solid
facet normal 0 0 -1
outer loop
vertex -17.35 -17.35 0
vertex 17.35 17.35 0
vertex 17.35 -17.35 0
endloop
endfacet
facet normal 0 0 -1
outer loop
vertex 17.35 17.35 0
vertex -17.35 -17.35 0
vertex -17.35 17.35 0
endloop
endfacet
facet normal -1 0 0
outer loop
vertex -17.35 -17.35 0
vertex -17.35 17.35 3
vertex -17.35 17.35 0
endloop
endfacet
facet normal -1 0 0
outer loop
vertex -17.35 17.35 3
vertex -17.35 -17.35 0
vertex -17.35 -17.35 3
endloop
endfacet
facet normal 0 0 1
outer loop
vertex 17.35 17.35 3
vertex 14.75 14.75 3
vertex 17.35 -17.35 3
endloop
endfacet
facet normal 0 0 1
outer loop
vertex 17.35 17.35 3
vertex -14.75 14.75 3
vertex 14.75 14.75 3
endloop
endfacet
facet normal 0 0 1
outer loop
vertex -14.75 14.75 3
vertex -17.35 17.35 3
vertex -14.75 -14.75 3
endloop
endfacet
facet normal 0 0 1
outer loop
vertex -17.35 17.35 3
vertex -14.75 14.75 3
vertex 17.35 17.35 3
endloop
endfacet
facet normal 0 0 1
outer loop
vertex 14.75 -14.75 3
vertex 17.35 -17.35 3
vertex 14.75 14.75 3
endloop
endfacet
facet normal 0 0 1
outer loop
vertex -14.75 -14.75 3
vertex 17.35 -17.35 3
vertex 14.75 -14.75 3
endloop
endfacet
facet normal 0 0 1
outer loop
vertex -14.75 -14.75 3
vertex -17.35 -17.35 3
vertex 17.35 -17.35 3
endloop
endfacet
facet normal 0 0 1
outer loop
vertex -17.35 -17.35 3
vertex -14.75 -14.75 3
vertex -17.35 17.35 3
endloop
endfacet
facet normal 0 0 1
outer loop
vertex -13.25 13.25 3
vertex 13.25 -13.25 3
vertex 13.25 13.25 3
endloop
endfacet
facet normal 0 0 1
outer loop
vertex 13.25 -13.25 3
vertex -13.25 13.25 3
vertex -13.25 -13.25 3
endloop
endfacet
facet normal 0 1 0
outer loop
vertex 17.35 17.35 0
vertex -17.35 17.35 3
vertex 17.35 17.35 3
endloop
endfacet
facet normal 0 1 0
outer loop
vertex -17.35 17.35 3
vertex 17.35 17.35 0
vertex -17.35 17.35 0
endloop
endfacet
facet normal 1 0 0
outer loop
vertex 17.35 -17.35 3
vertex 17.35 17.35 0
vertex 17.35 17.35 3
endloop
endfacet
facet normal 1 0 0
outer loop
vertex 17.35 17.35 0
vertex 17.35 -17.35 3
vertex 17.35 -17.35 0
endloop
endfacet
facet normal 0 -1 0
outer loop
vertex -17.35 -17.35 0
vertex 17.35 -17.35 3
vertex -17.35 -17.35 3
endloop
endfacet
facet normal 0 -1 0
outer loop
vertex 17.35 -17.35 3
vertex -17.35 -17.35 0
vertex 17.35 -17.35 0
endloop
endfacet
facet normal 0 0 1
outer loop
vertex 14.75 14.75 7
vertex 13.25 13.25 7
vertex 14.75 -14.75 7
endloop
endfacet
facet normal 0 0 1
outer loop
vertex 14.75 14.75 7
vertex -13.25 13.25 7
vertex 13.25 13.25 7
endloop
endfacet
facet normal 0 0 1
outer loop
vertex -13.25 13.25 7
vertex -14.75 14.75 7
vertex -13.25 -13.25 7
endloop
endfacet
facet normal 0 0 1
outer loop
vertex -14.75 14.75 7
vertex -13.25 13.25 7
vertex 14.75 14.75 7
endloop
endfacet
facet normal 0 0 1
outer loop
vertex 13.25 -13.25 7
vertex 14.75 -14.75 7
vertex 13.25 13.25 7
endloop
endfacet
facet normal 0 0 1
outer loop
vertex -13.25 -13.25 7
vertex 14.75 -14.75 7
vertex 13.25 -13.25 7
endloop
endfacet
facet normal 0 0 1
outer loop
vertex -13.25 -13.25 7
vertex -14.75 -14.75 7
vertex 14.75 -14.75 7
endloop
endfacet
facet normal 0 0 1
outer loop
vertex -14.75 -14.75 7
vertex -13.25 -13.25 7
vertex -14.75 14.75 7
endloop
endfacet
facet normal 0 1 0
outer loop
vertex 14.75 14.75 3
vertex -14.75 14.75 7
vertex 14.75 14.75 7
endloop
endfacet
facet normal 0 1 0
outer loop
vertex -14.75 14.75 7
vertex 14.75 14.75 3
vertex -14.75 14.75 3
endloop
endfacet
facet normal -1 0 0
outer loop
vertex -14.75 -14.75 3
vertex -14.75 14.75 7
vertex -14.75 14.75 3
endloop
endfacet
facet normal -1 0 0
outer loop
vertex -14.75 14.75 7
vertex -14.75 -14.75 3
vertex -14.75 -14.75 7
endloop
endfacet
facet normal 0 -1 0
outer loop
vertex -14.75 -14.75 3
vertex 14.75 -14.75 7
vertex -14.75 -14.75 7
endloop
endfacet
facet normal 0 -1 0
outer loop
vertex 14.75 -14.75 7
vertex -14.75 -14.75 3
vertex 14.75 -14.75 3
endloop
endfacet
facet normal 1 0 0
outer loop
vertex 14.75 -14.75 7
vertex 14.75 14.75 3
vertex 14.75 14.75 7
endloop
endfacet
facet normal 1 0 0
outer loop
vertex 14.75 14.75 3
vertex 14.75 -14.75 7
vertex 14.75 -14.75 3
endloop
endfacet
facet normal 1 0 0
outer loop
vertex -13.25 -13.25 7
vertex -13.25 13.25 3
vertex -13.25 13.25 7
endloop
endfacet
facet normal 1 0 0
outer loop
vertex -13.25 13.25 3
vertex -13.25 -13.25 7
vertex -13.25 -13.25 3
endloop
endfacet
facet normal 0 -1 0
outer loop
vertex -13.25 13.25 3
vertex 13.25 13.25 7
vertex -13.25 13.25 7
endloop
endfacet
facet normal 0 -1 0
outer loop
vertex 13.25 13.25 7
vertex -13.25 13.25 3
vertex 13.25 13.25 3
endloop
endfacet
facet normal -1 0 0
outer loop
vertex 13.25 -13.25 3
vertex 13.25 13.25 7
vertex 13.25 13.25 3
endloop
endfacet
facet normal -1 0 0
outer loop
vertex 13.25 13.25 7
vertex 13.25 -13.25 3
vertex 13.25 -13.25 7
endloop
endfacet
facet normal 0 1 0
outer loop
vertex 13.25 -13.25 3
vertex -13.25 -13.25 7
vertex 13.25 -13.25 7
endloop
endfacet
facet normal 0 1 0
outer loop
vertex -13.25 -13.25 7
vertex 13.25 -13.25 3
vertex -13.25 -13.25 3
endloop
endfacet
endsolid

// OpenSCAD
// file: ../diffuser.scad
// Swappable diffuser panel. Thickness is the STL knob; the diffusing structure
// (gyroid/grid, density, top/bottom solid layers = 0) is set in the slicer.

module diffuser_panel(t) {
    linear_extrude(t) square([panel_side, panel_side], center = true);
}

// Diffuser LID = flanged plug. The plug drops INTO the opening (locates it, light
// grip so it won't slide); the flange overhangs by ~the wall width and rests on
// the rim so it can't fall through. Lifts straight off for swapping, and works on
// touching chimneys (the plug uses the open hole, not the side walls). The flange
// is the diffuser face (thickness t). Set lid_plug_h = 0 for a plain flat tile.
// Modeled diffuser-face-down (z=0..t) = print orientation; flip in use.
module diffuser_lid(t) {
    fside = cell_inner + 2 * lid_flange_cover - lid_flange_gap;  // flange (rests on the rim)
    pside = cell_inner - lid_plug_clear;                          // plug (drops into the opening)
    union() {
        linear_extrude(t) square([fside, fside], center = true); // flange / diffuser face
        if (lid_plug_h > 0)
            translate([0, 0, t])
                linear_extrude(lid_plug_h)
                    difference() {
                        square([pside, pside], center = true);
                        square([pside - 2 * lid_plug_wall, pside - 2 * lid_plug_wall], center = true);
                    }
    }
}

// Slide-over diffuser CAP: a diffuser top + a skirt that slides over the OUTSIDE
// of a chimney. Only works on an ISOLATED column (needs side clearance for the
// skirt) — kept for possible use on the real letters, NOT the touching coupon.
// Modeled diffuser-face-down (z=0..t) = print orientation.
module diffuser_cap(t) {
    si = cell_pitch + cap_fit_clear;      // skirt inner — slides over the chimney outer
    so = si + 2 * cap_skirt_t;            // skirt outer
    union() {
        linear_extrude(t) square([so, so], center = true);          // diffuser face
        translate([0, 0, t])
            linear_extrude(cap_skirt_h)                             // skirt
                difference() {
                    square([so, so], center = true);
                    square([si, si], center = true);
                }
    }
}
// file: ../config.scad
// ===== CHARGE LED sign — global config =====
// Edit this file; then run ./build.sh to regenerate every STL.

$fn = 72;

// ---- calibrated collar (press-fit for 12mm bullet pixel) ----
collar_stl    = "../../assets/bullet-collar.stl"; // path resolved from src/parts/ entry files
collar_h      = 2.0;     // Z span of the collar STL
collar_od     = 16.0;    // collar outer diameter
collar_cx     = 43.0;    // STL native X center (Y center is 0)
pixel_through = 12.3;    // clearance hole through the plate (just over bore Ø12.19)
dome_clear    = 4.0;     // dome protrusion above plate front. Spec: 5.5mm dome-tip-to-flange,
                         // flange seats on plate back, minus 2mm plate ~= 3.5-4mm. Seat a real
                         // pixel and measure to lock it in.

// ---- shell ----
plate_t    = 2.0;        // rear plate thickness (== collar_h, so the collar sits flush)
wall_t     = 2.5;        // chimney wall thickness
cell_inner = 30;         // square interior of each test cell (the press-fit opening)

// ---- diffuser panels (flat, drop-in — kept for the final glued option) ----
panel_press_clear = 0.25; // panel is this much SMALLER than the opening (total) -> friction fit
panel_thicks      = [1, 2, 3];

// ---- diffuser CAP (slides over an ISOLATED chimney; not used on touching rows) ----
cap_fit_clear = 0.4;   // skirt-inner minus chimney-outer (total); bigger = looser slide
cap_skirt_t   = 1.6;   // skirt wall thickness
cap_skirt_h   = 7;     // how far the skirt grips down over the chimney

// ---- diffuser LID = flanged plug (plug locates in the opening, flange catches on the rim) ----
lid_flange_cover = wall_t;  // flange overhang per side ~= wall width (rests on rim, can't fall in)
lid_flange_gap   = 0.3;     // shrink the flange a hair so neighbour lids don't clash
lid_plug_h       = 4;       // how far the plug drops into the opening (0 = plain flat tile)
lid_plug_clear   = 0.5;     // plug-outer = opening minus this (total) -> snug slip fit
lid_plug_wall    = 1.5;     // plug-frame wall thickness

// ---- coupon depth ladder ----
led_gaps = [20, 35, 50]; // clear LED-tip -> panel distance, per cell (mm)

// ---- collar v2: original bore + lip, plus a 45-deg lead-in chamfer ----
bore_face_r   = 6.10;    // collar bore radius at each face (~Ø12.2)
chamfer_depth = 0.5;     // axial depth of the 45-deg lead-in at each face
mouth_r       = bore_face_r + chamfer_depth;  // chamfer mouth radius (~Ø13.2)

// ---- collar A/B test harness ----
harness_w     = 52;      // tile width
harness_d     = 30;      // tile depth
harness_t     = plate_t; // match the real wall thickness for a faithful fit test
harness_pitch = 24;      // spacing between the two hole centers

// ---- derived ----
cell_pitch = cell_inner + 2 * wall_t;      // outer cell footprint (35)
n_cells    = len(led_gaps);
plate_w    = n_cells * cell_pitch;
plate_d    = cell_pitch;
panel_side = cell_inner - panel_press_clear;
function cell_x(i)     = i * cell_pitch + cell_pitch / 2;
function chimney_H(i)  = plate_t + dome_clear + led_gaps[i];
// main file
// Build target: 3mm flanged-plug diffuser lid.
include <../config.scad>
include <../diffuser.scad>
diffuser_lid(3);
